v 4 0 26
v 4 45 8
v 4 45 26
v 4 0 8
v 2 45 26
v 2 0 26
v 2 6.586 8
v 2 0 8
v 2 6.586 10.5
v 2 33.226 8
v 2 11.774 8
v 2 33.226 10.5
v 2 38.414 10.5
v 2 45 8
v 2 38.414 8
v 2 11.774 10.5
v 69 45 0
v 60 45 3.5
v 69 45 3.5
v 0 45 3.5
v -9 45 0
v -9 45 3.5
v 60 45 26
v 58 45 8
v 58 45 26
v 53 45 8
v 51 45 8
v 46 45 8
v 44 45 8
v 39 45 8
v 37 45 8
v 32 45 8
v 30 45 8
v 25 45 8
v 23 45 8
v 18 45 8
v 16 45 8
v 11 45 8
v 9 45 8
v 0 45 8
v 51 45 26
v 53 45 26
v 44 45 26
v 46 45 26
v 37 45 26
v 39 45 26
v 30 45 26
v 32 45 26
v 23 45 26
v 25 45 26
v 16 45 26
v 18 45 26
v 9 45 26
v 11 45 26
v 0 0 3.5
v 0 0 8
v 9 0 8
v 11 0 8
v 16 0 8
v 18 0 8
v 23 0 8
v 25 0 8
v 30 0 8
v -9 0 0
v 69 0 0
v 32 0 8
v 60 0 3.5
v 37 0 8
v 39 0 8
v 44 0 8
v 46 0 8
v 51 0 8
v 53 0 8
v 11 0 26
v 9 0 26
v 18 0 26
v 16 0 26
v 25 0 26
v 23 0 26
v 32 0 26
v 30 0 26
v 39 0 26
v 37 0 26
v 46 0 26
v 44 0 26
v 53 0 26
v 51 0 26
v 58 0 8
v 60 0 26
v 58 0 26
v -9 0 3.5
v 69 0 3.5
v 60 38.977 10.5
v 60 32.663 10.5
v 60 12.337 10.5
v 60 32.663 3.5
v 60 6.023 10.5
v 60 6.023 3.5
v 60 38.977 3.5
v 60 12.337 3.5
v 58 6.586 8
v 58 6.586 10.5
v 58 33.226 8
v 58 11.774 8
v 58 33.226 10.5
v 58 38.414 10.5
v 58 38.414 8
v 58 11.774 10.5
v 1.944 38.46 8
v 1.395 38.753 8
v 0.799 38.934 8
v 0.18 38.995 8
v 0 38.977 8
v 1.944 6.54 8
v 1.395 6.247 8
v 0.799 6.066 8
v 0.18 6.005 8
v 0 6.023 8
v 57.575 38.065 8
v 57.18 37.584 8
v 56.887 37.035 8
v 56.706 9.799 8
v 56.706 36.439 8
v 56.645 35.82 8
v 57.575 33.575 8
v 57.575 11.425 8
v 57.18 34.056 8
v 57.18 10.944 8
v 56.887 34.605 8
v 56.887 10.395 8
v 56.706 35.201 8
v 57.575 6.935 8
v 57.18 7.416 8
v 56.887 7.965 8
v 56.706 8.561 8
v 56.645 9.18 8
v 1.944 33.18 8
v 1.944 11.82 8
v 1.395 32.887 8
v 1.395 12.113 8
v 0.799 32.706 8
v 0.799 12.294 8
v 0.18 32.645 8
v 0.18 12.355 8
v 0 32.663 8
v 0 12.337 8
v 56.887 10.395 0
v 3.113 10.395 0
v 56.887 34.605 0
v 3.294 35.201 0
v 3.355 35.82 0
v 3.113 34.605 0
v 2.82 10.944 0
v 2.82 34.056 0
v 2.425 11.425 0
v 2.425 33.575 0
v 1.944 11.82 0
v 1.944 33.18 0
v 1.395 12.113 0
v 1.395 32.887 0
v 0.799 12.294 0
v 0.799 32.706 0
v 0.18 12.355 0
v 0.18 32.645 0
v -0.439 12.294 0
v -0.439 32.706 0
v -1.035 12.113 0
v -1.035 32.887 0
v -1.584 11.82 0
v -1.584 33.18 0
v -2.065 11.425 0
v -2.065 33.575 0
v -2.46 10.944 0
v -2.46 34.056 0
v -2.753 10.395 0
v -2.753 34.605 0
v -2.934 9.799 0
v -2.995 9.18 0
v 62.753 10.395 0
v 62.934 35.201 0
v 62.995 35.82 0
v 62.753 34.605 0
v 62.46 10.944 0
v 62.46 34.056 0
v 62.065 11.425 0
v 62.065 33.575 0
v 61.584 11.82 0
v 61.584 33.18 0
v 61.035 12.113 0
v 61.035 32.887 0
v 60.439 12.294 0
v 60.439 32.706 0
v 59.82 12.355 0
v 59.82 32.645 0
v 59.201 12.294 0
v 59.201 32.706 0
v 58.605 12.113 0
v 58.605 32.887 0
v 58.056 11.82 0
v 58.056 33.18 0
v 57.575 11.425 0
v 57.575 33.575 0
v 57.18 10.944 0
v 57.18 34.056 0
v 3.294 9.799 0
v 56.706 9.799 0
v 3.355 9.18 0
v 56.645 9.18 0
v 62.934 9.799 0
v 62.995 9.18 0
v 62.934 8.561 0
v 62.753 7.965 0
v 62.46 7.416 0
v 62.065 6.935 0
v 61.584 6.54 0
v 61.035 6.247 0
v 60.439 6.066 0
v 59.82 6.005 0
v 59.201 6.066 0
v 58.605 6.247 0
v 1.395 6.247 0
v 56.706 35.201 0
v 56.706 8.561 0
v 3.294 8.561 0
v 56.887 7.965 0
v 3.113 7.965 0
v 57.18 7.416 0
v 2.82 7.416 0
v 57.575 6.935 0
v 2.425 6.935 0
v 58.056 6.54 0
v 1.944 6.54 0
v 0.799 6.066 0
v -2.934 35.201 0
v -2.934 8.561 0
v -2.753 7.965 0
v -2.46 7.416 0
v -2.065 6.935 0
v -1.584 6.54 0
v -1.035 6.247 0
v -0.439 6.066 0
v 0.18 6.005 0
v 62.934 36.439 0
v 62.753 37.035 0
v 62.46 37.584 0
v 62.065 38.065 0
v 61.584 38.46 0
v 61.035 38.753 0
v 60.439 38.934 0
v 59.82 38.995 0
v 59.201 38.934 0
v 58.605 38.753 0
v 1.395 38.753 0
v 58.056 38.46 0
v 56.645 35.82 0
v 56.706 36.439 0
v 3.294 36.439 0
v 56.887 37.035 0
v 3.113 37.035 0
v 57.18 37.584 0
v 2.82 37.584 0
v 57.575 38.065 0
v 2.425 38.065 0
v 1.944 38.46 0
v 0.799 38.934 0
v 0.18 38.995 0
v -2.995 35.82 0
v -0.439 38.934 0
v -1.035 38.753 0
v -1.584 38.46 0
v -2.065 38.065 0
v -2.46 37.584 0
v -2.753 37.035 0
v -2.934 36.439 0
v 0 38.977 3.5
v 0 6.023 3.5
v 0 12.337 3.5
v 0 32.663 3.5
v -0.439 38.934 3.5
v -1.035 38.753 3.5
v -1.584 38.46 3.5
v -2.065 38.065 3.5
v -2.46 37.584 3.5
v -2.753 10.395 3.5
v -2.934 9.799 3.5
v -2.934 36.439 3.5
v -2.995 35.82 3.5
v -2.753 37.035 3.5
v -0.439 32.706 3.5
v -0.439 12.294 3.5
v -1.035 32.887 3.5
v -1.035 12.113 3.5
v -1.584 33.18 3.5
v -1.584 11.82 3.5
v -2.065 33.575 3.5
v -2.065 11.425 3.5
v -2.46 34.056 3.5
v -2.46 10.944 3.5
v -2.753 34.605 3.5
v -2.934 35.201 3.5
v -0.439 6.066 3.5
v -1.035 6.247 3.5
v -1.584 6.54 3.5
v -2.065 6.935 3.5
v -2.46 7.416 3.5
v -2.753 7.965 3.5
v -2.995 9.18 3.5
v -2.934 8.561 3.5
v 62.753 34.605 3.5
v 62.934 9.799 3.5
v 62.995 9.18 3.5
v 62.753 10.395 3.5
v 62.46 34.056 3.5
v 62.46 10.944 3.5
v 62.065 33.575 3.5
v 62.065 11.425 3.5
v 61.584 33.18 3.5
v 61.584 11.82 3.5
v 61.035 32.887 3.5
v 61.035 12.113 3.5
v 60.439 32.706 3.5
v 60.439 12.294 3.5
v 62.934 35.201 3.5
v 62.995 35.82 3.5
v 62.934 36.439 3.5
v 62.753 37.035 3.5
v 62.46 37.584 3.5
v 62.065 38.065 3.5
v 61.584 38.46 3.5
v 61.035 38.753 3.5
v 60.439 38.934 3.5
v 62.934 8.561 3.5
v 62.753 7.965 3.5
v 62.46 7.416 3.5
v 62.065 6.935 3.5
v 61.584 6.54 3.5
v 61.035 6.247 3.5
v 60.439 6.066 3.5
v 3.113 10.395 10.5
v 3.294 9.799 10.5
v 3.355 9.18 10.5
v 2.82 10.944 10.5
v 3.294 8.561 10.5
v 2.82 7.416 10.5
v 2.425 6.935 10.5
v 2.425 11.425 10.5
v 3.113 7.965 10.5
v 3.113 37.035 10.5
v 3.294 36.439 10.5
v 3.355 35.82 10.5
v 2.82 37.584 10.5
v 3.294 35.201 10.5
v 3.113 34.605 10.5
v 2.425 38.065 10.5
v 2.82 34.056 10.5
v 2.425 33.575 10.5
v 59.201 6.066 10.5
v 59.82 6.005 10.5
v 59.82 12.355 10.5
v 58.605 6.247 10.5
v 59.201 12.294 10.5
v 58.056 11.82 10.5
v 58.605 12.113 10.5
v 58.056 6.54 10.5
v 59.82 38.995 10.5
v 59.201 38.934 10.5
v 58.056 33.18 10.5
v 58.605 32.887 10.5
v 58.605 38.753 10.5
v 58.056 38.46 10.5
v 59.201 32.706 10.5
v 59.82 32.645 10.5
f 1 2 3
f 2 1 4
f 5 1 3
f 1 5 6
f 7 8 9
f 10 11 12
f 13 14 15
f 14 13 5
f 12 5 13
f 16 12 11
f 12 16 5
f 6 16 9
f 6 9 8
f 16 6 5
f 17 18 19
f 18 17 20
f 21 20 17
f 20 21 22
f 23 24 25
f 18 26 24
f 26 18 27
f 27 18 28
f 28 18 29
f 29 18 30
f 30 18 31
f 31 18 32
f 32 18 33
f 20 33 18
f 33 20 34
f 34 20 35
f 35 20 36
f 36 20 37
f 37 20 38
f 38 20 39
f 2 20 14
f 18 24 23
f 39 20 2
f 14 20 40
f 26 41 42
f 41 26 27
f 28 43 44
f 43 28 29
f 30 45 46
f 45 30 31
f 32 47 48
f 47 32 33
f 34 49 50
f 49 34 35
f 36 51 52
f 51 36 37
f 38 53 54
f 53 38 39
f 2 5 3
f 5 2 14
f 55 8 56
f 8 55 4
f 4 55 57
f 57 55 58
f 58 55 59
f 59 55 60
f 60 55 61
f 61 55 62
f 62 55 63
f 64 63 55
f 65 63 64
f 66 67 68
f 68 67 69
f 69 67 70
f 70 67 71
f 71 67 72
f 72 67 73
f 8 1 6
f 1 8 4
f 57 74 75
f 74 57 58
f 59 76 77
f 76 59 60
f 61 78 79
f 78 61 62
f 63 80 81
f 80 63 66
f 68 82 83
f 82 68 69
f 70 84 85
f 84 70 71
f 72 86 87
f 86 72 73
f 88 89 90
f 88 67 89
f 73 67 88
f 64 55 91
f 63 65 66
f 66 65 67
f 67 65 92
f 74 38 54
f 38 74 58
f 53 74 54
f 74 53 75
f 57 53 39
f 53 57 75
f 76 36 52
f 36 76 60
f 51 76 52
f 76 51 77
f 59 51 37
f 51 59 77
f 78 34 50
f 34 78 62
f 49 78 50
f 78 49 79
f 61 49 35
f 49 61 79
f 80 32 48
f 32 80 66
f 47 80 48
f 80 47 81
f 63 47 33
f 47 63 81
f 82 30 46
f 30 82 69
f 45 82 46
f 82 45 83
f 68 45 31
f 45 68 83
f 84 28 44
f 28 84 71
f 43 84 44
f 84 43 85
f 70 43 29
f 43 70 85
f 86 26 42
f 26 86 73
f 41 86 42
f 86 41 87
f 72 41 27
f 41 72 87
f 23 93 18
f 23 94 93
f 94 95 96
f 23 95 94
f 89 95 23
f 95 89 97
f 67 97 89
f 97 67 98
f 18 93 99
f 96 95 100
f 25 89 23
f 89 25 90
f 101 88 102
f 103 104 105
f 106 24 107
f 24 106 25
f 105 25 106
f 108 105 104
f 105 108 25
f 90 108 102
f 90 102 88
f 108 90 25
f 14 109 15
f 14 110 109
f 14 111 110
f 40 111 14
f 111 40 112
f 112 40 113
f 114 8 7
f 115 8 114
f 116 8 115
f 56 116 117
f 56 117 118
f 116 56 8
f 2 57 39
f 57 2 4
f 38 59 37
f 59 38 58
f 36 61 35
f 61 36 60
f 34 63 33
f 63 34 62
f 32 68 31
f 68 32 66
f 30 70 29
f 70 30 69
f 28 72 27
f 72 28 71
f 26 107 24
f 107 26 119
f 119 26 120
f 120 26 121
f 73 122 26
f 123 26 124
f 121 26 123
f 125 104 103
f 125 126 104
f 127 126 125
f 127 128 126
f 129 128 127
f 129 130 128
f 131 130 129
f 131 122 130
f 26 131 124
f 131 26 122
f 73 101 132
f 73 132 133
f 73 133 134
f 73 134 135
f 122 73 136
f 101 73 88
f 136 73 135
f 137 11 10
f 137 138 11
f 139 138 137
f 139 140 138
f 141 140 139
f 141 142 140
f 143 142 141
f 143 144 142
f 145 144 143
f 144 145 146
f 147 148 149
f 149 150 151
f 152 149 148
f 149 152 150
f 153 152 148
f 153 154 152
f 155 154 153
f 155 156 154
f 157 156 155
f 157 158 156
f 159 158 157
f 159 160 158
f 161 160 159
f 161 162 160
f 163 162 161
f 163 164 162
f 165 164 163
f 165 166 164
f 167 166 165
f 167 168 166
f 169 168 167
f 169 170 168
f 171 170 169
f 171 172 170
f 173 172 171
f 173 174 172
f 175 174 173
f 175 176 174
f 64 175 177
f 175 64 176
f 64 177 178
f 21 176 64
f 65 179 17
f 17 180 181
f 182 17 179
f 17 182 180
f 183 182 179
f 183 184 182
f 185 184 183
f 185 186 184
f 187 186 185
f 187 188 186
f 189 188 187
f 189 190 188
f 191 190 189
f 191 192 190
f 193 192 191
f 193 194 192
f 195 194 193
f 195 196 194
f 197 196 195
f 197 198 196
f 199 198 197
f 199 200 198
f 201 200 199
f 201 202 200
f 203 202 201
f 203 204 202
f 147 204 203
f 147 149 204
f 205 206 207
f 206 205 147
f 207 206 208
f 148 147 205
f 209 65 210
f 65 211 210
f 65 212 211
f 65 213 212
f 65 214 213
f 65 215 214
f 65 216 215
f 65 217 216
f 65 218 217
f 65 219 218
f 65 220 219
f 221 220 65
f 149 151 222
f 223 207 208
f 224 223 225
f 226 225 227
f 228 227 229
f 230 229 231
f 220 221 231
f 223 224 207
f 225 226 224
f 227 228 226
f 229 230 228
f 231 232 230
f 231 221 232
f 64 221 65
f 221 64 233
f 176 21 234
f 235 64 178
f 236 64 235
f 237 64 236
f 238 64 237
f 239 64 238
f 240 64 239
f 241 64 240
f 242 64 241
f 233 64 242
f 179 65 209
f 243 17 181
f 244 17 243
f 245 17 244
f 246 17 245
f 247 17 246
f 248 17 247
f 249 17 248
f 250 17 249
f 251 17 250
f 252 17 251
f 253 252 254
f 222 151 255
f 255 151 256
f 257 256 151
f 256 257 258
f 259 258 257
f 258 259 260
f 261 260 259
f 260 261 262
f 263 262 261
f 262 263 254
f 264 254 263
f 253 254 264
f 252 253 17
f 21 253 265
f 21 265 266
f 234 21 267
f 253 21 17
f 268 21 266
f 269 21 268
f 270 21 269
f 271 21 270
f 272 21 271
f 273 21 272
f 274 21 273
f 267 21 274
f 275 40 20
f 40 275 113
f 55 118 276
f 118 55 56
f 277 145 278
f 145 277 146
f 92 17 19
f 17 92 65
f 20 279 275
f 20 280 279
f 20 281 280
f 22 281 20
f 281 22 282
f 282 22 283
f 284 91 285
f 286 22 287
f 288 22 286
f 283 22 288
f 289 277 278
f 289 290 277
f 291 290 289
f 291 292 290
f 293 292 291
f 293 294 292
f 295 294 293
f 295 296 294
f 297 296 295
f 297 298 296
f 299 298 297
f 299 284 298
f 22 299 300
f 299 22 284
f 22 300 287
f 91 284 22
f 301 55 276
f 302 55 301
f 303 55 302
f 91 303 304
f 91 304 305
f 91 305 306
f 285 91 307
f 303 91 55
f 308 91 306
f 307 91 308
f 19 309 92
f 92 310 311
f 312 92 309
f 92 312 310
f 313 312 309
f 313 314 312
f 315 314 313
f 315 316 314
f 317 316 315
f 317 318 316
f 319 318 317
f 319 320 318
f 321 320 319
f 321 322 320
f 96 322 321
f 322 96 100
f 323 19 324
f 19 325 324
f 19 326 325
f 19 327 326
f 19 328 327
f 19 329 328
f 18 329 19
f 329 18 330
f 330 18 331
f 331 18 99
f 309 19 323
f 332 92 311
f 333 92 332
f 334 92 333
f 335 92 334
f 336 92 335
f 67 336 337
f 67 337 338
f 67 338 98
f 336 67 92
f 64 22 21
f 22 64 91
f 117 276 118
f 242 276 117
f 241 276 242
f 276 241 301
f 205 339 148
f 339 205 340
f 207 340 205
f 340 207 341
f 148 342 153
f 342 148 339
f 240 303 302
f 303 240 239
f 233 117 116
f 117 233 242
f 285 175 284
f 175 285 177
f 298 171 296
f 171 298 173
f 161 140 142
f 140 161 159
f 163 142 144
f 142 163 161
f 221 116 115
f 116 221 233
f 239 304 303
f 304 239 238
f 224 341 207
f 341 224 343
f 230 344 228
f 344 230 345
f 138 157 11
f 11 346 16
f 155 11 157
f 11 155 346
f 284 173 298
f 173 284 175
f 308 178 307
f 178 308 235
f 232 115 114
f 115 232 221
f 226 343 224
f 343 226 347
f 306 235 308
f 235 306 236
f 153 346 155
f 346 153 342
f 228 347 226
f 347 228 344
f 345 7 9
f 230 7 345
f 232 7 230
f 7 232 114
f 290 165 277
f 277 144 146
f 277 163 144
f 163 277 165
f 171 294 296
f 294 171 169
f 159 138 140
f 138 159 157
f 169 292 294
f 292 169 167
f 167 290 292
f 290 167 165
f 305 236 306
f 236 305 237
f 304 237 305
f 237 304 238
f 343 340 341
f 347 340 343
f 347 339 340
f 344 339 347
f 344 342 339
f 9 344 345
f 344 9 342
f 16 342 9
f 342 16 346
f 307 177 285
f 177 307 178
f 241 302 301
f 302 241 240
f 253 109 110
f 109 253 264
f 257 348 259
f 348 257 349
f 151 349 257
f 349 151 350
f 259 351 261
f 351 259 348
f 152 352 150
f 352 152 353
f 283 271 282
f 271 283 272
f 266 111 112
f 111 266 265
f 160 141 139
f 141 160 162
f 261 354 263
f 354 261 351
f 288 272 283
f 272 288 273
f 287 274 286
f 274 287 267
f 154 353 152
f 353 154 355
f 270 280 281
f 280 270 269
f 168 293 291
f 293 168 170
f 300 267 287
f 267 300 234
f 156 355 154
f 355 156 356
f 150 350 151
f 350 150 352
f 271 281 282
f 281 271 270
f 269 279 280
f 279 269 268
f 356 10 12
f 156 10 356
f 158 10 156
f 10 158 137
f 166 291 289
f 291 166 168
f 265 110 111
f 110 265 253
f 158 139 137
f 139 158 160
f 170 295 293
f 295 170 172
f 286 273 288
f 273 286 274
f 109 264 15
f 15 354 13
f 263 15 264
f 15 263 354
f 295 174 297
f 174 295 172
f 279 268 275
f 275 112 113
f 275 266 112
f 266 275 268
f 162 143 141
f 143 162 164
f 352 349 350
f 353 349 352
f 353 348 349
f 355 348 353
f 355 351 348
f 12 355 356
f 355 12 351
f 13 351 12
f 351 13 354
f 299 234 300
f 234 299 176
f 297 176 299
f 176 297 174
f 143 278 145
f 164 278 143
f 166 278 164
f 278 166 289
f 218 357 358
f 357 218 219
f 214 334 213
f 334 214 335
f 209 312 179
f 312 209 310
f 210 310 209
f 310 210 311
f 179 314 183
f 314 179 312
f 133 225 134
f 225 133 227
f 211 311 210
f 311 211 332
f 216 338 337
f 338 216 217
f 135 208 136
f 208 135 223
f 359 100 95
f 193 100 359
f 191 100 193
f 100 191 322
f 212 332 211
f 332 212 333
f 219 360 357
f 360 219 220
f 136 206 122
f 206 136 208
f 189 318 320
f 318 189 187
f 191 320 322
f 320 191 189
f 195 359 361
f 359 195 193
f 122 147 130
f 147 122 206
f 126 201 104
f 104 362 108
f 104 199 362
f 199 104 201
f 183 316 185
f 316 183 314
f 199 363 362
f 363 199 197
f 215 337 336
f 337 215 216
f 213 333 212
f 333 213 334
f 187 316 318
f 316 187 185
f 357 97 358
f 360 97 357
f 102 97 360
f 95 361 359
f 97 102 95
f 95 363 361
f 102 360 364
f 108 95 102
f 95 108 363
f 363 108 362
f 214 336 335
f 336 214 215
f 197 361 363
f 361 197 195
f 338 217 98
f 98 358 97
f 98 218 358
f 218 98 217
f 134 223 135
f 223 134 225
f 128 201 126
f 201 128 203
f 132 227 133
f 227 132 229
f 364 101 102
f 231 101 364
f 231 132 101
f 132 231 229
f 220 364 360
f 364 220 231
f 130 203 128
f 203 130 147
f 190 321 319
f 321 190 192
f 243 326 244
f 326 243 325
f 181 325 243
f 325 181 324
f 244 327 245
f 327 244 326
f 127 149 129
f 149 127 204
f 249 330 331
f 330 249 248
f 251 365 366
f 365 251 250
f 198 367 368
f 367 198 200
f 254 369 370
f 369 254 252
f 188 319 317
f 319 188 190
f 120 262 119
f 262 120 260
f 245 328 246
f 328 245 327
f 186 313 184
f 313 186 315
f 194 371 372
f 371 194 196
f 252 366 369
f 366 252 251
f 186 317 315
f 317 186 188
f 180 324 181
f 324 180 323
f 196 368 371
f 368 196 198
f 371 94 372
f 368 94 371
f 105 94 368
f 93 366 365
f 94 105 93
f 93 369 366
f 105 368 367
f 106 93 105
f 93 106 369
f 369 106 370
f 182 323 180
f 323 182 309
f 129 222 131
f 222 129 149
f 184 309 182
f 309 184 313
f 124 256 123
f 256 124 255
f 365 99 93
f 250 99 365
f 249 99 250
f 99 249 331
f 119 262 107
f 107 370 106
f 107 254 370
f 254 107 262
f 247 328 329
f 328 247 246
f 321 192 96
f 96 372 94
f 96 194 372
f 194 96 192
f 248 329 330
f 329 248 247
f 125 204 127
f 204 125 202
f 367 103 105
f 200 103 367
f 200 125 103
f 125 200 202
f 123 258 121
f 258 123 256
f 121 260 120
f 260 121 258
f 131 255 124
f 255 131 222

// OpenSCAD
$fn = 32;

// ----------------------------------------------------------------------
// Finned heat sink: 60 x 45 mm base, 18 mm fins
// ----------------------------------------------------------------------

// --- parameters (mm) ---
base_w = 60;              // base width
base_d = 45;              // base depth
base_t = 8;               // base thickness
fin_h = 18;               // fin height above the base
holes_d = 6.35;           // fixing holes
hole_x = 29.82;           // hole offset in x
hole_y = 13.32;           // hole offset in y
fin_t = 2;                // fin thickness
fin_pitch = 7;            // fin pitch
fin_count = 9;            // number of fins
fin_x0 = 2;               // first fin offset
flange_w = 78;            // flange plate width
flange_t = 3;             // flange plate thickness

difference() {
  union() {
    cube([base_w, base_d, base_t]);
    for (i = [0 : fin_count - 1]) {
      translate([fin_x0 + i * fin_pitch, 0, base_t - 0.5]) cube([fin_t, base_d, fin_h + 0.5]);
    }
    /* mounting flange, a wider plate sharing the base bottom */
    translate([(base_w - flange_w) / 2, 0, 0]) cube([flange_w, base_d, flange_t + 0.5]);
  }
  /* fixing holes through the base, 2.5 mm clear on both sides */
  for (hx = [-29.82, 29.82]) {
    for (hy = [-13.32, 13.32]) {
      translate([base_w / 2 + hx, base_d / 2 + hy, -2.5]) cylinder(h = base_t + 5, d = holes_d);
    }
  }
}
